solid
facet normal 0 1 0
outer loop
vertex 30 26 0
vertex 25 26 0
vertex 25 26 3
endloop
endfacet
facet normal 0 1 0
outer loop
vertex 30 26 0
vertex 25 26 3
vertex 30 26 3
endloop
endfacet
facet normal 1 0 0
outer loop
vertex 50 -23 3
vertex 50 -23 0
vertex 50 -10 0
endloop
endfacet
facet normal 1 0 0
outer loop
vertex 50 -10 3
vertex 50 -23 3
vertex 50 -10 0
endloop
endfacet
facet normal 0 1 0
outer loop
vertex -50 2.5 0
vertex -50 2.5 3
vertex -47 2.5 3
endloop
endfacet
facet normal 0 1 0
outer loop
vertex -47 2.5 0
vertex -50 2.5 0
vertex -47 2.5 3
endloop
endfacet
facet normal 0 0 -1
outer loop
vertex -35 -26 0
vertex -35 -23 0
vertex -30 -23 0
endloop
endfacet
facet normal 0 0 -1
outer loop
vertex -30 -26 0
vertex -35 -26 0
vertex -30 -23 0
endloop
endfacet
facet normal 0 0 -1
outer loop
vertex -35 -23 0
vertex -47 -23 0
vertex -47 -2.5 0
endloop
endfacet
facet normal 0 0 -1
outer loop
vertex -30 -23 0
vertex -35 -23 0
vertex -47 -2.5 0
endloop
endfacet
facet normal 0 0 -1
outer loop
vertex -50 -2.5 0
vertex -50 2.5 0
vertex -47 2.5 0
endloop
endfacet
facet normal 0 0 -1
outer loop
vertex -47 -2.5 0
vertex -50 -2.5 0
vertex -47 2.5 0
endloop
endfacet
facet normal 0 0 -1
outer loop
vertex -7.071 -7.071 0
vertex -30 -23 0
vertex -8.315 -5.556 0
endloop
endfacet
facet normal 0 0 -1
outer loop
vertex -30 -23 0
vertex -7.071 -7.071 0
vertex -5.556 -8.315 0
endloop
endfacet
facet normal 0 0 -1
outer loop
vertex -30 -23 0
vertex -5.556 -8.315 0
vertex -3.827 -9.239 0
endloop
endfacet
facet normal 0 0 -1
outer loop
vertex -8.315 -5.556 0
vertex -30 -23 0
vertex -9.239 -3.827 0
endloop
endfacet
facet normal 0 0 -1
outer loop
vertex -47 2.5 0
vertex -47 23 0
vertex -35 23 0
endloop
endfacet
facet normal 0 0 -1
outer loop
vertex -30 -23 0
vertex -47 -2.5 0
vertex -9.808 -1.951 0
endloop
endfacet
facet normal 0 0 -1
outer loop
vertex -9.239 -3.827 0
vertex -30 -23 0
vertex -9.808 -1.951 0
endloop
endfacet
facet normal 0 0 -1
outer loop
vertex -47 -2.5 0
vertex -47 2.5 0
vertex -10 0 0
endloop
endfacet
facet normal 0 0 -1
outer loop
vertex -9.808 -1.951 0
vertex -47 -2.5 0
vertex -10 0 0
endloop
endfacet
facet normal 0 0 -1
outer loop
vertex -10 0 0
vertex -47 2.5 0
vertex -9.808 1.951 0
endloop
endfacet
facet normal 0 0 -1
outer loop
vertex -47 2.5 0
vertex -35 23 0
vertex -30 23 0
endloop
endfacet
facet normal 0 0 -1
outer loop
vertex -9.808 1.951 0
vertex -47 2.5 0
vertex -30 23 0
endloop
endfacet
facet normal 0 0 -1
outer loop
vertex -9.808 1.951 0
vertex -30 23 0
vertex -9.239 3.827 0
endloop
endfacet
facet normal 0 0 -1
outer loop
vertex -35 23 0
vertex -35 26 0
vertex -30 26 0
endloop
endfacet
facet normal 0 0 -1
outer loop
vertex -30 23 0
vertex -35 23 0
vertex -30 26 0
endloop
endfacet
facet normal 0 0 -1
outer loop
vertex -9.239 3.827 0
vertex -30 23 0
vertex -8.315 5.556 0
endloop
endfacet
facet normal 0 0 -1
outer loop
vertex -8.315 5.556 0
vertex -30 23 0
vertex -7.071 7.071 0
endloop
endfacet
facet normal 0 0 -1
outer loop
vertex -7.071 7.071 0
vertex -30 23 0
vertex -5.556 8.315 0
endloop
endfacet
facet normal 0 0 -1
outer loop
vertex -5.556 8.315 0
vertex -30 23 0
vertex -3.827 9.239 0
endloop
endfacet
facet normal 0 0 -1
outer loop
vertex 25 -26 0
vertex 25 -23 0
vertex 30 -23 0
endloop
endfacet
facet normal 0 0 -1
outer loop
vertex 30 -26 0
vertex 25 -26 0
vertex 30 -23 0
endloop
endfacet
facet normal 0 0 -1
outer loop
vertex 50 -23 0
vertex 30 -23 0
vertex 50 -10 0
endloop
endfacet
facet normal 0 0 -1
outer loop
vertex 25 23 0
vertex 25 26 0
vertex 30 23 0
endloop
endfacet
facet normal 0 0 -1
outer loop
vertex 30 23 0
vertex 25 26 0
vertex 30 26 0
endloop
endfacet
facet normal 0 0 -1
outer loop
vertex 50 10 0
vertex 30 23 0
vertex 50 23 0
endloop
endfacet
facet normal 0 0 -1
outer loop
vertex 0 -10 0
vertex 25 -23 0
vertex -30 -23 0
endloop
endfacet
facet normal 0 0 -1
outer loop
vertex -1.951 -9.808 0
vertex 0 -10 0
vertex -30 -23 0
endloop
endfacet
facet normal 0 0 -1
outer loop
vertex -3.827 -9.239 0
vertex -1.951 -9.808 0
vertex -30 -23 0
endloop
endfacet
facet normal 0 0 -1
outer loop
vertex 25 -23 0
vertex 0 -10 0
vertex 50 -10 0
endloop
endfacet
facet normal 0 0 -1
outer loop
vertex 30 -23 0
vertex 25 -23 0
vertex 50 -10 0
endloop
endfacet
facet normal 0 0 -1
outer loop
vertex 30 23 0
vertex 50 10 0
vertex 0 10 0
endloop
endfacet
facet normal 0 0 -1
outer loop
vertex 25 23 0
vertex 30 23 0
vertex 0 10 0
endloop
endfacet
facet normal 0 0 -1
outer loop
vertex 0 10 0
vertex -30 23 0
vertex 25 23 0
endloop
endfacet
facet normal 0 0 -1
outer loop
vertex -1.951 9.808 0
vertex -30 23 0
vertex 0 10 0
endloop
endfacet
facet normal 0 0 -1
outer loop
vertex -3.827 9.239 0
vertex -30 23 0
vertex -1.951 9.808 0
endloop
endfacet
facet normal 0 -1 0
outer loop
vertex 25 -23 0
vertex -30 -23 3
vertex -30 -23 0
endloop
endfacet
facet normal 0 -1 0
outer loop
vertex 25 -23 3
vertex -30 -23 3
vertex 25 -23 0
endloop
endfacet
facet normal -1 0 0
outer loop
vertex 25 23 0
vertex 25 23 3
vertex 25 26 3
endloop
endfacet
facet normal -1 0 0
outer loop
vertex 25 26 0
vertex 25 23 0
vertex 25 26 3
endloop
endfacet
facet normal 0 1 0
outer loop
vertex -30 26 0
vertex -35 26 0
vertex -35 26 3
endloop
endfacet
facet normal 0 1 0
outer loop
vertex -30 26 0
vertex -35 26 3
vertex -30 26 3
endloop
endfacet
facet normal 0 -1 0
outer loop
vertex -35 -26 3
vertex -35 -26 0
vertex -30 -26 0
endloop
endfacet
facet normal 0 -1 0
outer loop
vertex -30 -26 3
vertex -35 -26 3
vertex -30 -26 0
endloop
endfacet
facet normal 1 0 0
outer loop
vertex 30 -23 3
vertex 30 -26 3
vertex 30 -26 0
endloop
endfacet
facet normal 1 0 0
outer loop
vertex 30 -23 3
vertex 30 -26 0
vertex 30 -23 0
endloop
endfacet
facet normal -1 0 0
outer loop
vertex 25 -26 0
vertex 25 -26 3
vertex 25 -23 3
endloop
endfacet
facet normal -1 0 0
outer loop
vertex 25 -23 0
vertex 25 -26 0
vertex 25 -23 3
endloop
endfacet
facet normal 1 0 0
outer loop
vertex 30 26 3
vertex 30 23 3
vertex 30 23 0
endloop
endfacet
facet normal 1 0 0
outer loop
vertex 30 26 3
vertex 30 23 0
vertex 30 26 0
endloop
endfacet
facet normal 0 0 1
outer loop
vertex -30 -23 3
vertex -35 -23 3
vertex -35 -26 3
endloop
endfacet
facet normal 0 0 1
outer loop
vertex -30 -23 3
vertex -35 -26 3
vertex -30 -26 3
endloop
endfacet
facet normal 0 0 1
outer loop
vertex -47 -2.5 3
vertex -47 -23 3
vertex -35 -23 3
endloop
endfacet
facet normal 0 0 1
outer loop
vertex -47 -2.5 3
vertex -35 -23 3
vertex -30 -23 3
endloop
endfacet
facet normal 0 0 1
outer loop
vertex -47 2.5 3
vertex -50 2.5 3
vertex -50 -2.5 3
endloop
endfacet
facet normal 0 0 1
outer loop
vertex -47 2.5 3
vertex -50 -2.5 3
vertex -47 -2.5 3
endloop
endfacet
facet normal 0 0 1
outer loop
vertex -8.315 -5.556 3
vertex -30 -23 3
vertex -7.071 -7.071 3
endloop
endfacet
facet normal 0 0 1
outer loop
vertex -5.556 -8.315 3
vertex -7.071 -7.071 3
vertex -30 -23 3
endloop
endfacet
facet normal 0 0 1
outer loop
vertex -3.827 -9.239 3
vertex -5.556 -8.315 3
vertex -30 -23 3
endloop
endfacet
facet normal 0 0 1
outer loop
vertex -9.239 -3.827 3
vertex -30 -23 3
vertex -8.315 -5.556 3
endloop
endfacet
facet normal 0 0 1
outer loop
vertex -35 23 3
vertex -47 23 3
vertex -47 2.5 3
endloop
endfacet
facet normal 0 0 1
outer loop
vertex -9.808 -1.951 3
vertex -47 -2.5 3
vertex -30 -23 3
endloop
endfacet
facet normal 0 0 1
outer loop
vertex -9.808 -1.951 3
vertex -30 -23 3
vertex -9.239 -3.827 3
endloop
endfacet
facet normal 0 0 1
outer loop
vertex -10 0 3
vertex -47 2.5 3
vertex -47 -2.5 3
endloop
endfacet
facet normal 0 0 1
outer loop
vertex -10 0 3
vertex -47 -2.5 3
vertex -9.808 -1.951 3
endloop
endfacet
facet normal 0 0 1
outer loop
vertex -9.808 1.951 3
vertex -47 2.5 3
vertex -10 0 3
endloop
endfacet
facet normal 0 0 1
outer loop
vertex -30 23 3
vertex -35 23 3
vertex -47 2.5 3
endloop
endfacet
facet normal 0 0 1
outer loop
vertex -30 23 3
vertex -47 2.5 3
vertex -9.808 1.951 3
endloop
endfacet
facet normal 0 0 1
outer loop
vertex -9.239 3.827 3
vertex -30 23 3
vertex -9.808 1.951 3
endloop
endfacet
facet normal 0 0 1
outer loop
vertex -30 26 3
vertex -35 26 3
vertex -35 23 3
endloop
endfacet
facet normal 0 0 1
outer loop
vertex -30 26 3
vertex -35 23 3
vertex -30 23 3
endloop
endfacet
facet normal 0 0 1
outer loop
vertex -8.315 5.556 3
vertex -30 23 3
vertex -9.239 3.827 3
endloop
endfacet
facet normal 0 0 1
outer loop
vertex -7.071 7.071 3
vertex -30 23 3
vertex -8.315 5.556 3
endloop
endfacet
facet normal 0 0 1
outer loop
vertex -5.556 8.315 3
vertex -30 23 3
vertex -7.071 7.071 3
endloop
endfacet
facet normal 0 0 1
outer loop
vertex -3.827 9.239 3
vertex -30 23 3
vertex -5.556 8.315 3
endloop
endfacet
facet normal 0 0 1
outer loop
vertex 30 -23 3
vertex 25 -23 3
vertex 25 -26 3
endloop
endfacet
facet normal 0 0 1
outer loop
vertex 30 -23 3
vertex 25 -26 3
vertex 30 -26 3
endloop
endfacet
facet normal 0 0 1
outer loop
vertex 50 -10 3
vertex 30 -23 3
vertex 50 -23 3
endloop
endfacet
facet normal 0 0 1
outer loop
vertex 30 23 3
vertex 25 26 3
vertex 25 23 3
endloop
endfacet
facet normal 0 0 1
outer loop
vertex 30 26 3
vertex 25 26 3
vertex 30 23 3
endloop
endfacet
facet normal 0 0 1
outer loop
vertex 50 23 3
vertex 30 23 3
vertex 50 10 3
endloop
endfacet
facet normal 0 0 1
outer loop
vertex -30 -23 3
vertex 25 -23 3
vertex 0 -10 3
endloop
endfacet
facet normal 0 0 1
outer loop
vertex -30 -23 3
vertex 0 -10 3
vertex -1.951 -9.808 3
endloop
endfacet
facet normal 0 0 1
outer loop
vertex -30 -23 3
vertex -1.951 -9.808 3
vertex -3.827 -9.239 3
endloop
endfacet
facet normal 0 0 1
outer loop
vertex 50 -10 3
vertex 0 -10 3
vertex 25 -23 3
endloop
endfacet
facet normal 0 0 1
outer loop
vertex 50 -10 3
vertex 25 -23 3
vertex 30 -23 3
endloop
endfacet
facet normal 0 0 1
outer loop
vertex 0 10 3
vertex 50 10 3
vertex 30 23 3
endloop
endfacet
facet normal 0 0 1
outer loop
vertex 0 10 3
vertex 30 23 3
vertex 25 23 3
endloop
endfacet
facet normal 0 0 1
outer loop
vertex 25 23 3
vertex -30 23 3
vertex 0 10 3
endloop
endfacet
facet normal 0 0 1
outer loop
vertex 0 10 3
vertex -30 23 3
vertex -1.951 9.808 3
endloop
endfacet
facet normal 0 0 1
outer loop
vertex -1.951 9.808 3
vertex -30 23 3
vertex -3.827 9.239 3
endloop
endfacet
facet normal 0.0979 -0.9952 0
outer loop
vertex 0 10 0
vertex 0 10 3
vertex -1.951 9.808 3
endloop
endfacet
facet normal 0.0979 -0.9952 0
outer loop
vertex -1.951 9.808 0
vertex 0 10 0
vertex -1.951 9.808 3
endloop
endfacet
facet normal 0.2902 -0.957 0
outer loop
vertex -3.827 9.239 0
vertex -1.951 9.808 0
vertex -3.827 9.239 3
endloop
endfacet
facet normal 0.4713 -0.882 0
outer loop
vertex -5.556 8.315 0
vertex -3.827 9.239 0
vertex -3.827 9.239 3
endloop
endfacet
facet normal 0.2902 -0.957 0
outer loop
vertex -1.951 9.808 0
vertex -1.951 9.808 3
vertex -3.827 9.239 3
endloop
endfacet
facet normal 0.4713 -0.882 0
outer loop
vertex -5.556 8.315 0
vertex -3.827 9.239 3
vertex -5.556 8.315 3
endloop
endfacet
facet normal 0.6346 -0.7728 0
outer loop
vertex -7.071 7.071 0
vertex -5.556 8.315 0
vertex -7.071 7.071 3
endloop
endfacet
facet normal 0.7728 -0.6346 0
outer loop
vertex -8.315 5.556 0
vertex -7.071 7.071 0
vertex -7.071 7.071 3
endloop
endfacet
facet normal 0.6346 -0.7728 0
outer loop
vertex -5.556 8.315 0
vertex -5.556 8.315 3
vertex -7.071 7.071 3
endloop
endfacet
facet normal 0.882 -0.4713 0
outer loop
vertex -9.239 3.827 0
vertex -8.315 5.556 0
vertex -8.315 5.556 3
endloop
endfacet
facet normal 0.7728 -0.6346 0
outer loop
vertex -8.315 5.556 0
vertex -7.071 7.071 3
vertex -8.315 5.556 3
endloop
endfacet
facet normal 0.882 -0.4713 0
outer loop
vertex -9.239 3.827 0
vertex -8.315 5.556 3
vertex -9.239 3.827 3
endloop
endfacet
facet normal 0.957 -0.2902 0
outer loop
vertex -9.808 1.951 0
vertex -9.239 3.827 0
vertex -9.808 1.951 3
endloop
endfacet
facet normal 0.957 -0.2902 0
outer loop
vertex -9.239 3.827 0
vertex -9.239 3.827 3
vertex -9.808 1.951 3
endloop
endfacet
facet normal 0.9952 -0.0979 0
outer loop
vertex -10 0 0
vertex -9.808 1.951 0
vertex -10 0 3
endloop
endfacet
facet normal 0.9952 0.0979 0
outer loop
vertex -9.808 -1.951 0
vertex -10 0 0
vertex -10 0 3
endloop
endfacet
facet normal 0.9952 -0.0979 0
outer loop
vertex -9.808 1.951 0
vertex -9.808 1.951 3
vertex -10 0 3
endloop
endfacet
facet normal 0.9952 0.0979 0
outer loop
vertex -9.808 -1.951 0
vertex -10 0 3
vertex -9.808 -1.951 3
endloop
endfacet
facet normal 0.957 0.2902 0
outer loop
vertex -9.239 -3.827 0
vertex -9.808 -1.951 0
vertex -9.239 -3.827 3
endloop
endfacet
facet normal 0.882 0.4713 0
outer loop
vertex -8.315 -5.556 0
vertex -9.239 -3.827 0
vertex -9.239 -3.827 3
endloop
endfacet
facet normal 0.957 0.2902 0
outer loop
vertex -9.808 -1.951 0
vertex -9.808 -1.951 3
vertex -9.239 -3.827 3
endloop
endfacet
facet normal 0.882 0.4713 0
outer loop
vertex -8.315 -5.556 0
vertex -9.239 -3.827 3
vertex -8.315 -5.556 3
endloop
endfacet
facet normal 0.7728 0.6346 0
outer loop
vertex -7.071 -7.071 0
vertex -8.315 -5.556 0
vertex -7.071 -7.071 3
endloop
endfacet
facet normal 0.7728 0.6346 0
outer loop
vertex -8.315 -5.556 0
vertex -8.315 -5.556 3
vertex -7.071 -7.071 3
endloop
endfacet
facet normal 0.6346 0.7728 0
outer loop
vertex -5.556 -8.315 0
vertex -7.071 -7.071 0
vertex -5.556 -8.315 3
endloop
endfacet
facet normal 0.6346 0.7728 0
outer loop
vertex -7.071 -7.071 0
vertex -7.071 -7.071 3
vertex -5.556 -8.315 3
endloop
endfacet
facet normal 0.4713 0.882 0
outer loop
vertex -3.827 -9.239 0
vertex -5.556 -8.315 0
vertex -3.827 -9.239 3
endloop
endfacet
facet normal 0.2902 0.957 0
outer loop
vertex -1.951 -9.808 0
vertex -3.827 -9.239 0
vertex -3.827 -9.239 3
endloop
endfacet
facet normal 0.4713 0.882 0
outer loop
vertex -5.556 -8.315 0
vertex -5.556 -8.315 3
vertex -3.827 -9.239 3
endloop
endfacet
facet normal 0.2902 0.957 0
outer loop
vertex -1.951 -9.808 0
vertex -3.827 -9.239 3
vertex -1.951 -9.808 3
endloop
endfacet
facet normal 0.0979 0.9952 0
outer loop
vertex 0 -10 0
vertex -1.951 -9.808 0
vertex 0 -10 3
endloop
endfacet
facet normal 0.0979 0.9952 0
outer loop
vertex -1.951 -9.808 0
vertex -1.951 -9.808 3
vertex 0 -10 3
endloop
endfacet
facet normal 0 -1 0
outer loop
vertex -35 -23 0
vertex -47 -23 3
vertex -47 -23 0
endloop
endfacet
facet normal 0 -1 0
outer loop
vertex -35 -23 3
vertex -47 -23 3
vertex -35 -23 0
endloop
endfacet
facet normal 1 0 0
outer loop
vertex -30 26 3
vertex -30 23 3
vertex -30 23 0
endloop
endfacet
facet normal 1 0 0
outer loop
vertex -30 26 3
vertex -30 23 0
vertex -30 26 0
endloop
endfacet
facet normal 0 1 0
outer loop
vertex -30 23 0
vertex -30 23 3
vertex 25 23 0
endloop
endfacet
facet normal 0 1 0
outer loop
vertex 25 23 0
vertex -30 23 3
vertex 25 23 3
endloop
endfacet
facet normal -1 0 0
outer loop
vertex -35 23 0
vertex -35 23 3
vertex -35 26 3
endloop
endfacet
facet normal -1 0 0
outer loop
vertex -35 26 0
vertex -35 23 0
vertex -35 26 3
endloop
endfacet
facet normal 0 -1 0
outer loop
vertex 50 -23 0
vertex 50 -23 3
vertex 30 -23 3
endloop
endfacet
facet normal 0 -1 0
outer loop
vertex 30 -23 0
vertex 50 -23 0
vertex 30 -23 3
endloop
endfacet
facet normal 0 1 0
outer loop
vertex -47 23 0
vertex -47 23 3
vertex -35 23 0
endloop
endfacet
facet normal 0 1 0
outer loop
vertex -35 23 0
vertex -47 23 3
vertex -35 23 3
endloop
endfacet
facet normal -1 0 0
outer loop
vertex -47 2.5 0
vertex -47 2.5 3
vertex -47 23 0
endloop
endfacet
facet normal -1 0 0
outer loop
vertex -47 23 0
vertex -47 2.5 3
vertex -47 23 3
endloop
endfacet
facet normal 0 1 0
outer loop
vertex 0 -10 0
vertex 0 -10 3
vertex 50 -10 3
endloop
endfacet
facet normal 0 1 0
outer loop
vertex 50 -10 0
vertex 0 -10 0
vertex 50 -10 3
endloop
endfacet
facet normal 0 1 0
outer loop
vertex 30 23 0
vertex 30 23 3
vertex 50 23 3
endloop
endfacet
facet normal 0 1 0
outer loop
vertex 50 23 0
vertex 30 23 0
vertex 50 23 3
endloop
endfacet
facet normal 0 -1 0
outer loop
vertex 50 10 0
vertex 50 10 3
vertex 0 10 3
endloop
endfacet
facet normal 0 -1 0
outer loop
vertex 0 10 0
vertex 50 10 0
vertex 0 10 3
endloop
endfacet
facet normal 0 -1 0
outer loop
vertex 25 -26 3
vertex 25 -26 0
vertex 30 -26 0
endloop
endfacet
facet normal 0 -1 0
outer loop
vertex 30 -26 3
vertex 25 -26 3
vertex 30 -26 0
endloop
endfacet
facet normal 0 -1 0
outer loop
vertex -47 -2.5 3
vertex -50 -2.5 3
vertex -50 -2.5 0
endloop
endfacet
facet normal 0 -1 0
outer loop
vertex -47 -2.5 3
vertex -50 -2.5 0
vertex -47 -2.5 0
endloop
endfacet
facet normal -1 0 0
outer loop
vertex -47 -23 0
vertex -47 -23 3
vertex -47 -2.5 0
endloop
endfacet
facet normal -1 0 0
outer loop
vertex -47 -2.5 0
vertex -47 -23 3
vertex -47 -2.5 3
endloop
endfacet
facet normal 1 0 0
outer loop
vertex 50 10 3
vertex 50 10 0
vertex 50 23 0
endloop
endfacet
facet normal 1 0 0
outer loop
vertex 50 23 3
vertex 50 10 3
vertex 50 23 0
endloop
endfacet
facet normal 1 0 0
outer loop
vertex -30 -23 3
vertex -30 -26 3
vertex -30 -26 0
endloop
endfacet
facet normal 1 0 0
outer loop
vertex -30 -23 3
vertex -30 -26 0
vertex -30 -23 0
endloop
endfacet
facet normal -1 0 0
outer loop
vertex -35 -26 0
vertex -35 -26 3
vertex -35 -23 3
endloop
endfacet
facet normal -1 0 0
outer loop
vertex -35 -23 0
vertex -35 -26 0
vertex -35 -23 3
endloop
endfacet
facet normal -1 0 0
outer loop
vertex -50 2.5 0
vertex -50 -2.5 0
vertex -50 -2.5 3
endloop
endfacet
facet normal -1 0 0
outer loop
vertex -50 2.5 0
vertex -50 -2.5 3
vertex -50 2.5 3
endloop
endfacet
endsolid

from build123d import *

# Parameters (mm, degrees)
F0_W     = 100
F0_H     = 52
F1_DEPTH = 3
F3_W     = 12
F3_H     = 3
F3_W_2   = 3
F3_H_2   = 20.5
F3_W_3   = 55
F3_W_4   = 17
F4_DEPTH = 3.001
F6_DEPTH = 3.001


with BuildPart() as f1:
    # F0 (on Top) → F1 (new body)
    with BuildSketch(Plane.XY):
        Rectangle(F0_W, F0_H)
    extrude(amount=F1_DEPTH)

    # F3 (on face) → F4 (cut, through all)
    with BuildSketch(Plane.XY.offset(3)):
        with Locations((-41, 24.5)):
            Rectangle(F3_W, F3_H)
        with Locations((-48.5, 24.5)):
            Rectangle(F3_W_2, F3_H)
        with Locations((-48.5, 12.75)):
            Rectangle(F3_W_2, F3_H_2)
        with Locations((-48.5, -12.75)):
            Rectangle(F3_W_2, F3_H_2)
        with Locations((-48.5, -24.5)):
            Rectangle(F3_W_2, F3_H)
        with Locations((-41, -24.5)):
            Rectangle(F3_W, F3_H)
        with Locations((-2.5, -24.5)):
            Rectangle(F3_W_3, F3_H)
        with Locations((38.5, -24.5)):
            Rectangle(F3_W_4, F3_H)
        with Locations((48.5, -24.5)):
            Rectangle(F3_W_2, F3_H)
        with Locations((48.5, 24.5)):
            Rectangle(F3_W_2, F3_H)
        with Locations((38.5, 24.5)):
            Rectangle(F3_W_4, F3_H)
        with Locations((-2.5, 24.5)):
            Rectangle(F3_W_3, F3_H)
    extrude(amount=-F4_DEPTH, mode=Mode.SUBTRACT)

    # F5 (on face) → F6 (cut, through all)
    with BuildSketch(Plane.XY.offset(3)):
        with BuildLine():
            ThreePointArc((0, -10), (7.071068, -7.071068), (10, 0))
            ThreePointArc((10, 0), (7.071068, 7.071068), (0, 10))
            ThreePointArc((0, 10), (-10, 0), (0, -10))
        make_face()
        with BuildLine():
            ThreePointArc((0, 10), (7.071068, 7.071068), (10, 0))
            ThreePointArc((10, 0), (7.071068, -7.071068), (0, -10))
            Line((0, -10), (50, -10))
            Line((50, -10), (50, 10))
            Line((50, 10), (0, 10))
        make_face()
    extrude(amount=-F6_DEPTH, mode=Mode.SUBTRACT)


solid = f1.part
